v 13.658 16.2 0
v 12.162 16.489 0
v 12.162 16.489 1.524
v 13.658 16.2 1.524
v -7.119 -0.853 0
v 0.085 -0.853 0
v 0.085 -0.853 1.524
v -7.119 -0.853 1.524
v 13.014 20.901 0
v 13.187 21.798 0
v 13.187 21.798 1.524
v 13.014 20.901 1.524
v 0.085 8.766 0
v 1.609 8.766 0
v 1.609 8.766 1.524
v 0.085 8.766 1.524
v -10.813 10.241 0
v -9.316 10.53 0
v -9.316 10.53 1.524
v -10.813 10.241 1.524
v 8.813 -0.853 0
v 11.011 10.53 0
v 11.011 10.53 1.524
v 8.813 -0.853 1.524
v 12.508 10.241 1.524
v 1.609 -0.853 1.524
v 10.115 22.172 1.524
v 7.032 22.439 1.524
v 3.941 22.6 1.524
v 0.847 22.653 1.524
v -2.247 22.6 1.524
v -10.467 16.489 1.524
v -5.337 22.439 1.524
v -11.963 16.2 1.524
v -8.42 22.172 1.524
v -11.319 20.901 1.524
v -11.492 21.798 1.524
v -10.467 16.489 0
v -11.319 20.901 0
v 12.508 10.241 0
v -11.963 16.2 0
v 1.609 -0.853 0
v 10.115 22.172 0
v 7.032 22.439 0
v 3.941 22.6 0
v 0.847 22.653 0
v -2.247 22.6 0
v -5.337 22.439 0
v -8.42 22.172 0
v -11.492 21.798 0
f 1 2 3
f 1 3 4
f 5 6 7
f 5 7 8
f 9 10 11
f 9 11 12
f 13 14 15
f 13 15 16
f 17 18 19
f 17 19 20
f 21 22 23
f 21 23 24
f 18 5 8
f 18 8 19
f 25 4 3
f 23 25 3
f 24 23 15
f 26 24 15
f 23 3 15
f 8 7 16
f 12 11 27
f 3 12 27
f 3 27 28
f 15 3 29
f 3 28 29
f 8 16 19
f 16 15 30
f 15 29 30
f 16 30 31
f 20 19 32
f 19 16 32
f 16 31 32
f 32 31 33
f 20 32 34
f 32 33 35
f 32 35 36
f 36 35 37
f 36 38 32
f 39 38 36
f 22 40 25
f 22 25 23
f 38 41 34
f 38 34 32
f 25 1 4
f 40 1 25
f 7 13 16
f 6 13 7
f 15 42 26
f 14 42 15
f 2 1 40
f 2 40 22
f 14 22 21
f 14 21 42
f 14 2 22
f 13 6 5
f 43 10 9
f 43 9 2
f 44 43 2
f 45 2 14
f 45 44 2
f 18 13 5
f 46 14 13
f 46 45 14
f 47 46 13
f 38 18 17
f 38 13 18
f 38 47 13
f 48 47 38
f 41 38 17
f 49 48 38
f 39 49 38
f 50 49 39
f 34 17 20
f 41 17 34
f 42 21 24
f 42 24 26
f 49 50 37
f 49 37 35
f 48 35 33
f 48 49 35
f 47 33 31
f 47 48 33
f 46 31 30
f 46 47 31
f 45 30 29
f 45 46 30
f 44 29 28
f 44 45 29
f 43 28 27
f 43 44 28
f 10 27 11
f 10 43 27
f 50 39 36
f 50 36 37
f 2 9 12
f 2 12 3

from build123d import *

# Parameters (mm, degrees)
BOSS_EXTRUDE1_DEPTH = 1.524


with BuildPart() as part:
    # Sketch1 → Boss-Extrude1 (new body)
    with BuildSketch(Plane.XY):
        with BuildLine():
            Line((0.085387869, 8.76561387), (0.085387869, -0.853085355))
            Line((0.085387869, -0.853085355), (-7.118587452, -0.853085355))
            Line((-7.118587452, -0.853085355), (-9.316419949, 10.53014054))
            Line((-9.316419949, 10.53014054), (-10.812784042, 10.241227919))
            Line((-10.812784042, 10.241227919), (-11.963375606, 16.20048264))
            Line((-11.963375606, 16.20048264), (-10.467011514, 16.489395261))
            Line((-10.467011514, 16.489395261), (-11.318780173, 20.900957592))
            Line((-11.318780173, 20.900957592), (-11.491926915, 21.797735888))
            ThreePointArc((-11.491926915, 21.797735888), (0.847387869, 22.653117291), (13.186702652, 21.797735888))
            Line((13.186702652, 21.797735888), (13.01355591, 20.900957592))
            Line((13.01355591, 20.900957592), (12.161787251, 16.489395261))
            Line((12.161787251, 16.489395261), (13.658151343, 16.20048264))
            Line((13.658151343, 16.20048264), (12.507559779, 10.241227919))
            Line((12.507559779, 10.241227919), (11.011195687, 10.53014054))
            Line((11.011195687, 10.53014054), (8.813363189, -0.853085355))
            Line((8.813363189, -0.853085355), (1.609387869, -0.853085355))
            Line((1.609387869, -0.853085355), (1.609387869, 8.76561387))
            Line((1.609387869, 8.76561387), (0.085387869, 8.76561387))
        make_face()
    extrude(amount=BOSS_EXTRUDE1_DEPTH)


solid = part.part
